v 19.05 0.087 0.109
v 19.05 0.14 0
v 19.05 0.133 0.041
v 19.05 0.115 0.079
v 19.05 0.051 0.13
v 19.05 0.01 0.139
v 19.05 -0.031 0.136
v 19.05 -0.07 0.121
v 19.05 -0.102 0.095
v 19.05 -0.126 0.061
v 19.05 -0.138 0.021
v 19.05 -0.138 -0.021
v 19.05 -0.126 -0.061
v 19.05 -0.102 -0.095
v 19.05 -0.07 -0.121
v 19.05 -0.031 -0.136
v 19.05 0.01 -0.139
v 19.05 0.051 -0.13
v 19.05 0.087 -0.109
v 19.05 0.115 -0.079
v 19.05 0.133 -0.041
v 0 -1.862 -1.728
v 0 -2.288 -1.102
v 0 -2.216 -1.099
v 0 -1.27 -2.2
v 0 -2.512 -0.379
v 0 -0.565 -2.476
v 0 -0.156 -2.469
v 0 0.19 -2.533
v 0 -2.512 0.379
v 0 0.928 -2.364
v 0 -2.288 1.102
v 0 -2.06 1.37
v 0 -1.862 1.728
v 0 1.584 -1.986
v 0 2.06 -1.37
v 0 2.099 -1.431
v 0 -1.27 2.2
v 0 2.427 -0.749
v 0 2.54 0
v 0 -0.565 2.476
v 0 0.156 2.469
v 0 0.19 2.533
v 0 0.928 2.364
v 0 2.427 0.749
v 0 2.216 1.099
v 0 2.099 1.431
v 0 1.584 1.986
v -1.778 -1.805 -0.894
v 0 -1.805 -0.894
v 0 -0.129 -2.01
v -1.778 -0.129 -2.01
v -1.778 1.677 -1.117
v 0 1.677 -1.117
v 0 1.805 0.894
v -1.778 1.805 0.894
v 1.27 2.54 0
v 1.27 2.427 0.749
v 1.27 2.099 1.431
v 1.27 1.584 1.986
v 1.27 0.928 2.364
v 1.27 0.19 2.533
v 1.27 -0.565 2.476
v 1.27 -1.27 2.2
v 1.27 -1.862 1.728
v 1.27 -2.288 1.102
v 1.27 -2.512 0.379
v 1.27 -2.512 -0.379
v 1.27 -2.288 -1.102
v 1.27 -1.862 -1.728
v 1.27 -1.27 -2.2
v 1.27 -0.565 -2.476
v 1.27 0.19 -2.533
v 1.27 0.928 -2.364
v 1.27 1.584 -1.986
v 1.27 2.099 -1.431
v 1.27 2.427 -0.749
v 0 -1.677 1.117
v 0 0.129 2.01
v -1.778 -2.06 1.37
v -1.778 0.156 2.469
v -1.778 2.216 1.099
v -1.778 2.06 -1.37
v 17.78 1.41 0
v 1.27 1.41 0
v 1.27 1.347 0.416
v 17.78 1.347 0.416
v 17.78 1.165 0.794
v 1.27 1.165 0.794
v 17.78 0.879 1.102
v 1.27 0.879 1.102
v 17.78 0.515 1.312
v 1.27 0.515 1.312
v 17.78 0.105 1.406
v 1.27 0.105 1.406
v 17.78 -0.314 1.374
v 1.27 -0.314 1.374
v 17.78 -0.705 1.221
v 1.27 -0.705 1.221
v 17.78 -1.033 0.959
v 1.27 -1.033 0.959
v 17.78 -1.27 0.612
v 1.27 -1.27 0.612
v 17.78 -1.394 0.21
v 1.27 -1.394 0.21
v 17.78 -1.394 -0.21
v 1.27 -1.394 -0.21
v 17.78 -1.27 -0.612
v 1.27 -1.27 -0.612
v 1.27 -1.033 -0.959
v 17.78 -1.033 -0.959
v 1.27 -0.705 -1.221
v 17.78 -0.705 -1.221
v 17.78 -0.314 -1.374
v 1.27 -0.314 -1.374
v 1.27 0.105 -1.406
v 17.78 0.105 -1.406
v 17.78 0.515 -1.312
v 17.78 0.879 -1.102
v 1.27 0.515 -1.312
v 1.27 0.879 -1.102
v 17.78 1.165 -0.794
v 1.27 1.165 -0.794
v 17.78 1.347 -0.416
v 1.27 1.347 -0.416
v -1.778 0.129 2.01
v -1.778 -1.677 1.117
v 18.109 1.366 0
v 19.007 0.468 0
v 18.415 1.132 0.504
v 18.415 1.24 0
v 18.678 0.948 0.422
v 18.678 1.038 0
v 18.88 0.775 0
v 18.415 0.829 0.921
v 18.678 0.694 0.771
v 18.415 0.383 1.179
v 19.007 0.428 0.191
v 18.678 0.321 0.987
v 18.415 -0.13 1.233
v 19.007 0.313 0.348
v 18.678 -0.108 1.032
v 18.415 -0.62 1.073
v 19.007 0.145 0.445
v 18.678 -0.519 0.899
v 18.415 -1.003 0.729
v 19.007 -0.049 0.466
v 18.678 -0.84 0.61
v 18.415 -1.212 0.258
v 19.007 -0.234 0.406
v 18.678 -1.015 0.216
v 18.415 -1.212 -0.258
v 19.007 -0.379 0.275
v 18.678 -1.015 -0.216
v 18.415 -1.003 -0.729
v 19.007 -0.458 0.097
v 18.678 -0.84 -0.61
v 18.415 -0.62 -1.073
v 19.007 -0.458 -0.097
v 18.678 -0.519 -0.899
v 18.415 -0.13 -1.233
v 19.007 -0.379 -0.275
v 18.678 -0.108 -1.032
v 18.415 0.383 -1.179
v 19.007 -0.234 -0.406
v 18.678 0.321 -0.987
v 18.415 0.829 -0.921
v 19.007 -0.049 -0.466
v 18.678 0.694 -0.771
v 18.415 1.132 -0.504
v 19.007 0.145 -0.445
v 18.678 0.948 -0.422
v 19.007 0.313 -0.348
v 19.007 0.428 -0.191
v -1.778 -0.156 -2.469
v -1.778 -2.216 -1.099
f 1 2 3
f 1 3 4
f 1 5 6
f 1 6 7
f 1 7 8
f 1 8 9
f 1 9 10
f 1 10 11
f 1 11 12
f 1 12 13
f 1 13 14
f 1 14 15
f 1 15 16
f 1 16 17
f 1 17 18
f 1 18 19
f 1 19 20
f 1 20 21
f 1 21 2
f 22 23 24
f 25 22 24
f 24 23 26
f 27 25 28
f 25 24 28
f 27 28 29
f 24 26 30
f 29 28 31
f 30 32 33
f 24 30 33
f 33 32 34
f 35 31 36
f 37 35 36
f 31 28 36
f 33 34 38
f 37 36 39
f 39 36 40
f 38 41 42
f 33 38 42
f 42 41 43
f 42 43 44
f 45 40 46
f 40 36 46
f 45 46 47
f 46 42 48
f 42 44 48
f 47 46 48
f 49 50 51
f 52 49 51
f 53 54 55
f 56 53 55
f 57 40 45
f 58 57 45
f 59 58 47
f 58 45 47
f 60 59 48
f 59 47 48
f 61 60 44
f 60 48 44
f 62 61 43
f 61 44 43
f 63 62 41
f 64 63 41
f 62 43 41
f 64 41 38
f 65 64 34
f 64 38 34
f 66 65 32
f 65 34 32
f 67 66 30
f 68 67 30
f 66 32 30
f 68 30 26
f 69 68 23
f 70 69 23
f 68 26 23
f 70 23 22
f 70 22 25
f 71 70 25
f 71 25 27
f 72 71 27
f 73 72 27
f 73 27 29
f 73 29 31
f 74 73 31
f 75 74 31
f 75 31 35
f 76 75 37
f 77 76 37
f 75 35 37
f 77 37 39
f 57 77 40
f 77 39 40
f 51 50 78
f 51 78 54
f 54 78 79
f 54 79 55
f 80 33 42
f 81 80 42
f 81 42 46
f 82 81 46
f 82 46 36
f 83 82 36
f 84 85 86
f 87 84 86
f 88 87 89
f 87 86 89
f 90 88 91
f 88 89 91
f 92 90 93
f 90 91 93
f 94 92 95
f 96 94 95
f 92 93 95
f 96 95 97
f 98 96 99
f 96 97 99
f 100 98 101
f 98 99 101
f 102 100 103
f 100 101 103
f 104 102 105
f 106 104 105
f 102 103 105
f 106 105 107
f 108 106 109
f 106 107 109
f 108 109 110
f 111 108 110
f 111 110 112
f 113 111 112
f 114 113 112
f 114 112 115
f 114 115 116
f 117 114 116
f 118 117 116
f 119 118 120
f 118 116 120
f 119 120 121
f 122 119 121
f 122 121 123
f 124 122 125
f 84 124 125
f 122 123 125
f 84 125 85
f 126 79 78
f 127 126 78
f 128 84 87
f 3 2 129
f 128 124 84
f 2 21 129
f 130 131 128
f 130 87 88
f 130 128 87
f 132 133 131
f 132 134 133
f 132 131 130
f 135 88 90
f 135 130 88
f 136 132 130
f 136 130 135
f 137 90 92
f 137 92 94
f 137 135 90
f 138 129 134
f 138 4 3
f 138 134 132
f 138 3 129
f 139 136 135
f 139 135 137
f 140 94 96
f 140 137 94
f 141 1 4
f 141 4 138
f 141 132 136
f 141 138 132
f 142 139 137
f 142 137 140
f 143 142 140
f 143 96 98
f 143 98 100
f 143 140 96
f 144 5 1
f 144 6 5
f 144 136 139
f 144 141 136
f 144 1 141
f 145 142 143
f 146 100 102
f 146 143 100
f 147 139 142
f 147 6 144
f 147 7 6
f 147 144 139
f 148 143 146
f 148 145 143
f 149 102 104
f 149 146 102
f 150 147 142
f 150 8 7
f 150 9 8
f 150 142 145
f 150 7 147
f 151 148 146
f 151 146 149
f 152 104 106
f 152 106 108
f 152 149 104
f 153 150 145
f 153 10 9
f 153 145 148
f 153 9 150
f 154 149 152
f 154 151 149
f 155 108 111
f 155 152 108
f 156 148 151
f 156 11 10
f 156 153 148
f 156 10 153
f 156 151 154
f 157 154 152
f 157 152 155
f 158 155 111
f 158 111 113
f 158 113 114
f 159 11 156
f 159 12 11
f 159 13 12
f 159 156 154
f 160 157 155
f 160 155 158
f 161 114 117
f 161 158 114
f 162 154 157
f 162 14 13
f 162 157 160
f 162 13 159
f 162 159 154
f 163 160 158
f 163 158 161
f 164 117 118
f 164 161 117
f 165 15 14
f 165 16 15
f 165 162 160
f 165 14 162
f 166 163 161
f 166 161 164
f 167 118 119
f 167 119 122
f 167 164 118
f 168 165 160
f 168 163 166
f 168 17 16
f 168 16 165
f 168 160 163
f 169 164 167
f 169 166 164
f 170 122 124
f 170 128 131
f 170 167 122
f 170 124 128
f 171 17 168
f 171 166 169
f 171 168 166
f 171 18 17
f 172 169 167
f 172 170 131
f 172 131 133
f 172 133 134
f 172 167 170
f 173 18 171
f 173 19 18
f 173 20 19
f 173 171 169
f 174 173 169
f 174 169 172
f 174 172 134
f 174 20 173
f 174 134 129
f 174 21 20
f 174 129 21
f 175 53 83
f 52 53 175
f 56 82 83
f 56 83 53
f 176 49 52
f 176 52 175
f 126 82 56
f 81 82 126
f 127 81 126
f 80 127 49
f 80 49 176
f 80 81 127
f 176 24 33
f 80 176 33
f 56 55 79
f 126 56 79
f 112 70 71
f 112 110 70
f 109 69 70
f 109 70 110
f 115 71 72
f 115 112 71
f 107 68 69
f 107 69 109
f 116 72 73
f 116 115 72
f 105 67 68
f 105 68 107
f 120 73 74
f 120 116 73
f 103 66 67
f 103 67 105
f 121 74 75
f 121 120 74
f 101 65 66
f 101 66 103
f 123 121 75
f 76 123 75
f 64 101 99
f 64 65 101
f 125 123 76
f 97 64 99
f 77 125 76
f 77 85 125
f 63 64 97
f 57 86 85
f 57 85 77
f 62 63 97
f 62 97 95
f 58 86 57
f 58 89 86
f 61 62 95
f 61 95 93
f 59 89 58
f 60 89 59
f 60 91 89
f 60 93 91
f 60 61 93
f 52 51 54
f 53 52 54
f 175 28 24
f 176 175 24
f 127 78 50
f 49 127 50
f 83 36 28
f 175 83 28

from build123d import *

# Parameters (mm, degrees)
F0_R     = 2.54
F1_DEPTH = 1.27
F3_DEPTH = 1.778
F4_R     = 1.4097
F5_DEPTH = 17.78
F6_R     = 1.27


with BuildPart() as f1:
    # F0 (on Right) → F1 (new body)
    with BuildSketch(Plane.YZ):
        Circle(F0_R)
    extrude(amount=F1_DEPTH)

    # F2 (on face) → F3 (join)
    with BuildSketch(Plane(origin=(0, 0, 0), x_dir=(0, -1, 0), z_dir=(-1, 0, 0))):
        Polygon((-2.0598, -1.369699), (0.156294, -2.468689), (2.216094, -1.09899), (2.0598, 1.369699), (-0.156294, 2.468689), (-2.216094, 1.09899), align=None)
        Polygon((1.805483, -0.893684), (0.128788, -2.010436), (-1.676694, -1.116752), (-1.805483, 0.893684), (-0.128788, 2.010436), (1.676694, 1.116752), align=None, mode=Mode.SUBTRACT)
    extrude(amount=F3_DEPTH)

    # F4 (on face) → F5 (join)
    with BuildSketch(Plane.YZ.offset(1.27)):
        Circle(F4_R)
    extrude(amount=F5_DEPTH)

    # F6
    f6_edges = [f1.edges().sort_by_distance(p)[0] for p in [
        (19.05, -1.4097, 0),
    ]]
    fillet(f6_edges, radius=F6_R)


solid = f1.part
